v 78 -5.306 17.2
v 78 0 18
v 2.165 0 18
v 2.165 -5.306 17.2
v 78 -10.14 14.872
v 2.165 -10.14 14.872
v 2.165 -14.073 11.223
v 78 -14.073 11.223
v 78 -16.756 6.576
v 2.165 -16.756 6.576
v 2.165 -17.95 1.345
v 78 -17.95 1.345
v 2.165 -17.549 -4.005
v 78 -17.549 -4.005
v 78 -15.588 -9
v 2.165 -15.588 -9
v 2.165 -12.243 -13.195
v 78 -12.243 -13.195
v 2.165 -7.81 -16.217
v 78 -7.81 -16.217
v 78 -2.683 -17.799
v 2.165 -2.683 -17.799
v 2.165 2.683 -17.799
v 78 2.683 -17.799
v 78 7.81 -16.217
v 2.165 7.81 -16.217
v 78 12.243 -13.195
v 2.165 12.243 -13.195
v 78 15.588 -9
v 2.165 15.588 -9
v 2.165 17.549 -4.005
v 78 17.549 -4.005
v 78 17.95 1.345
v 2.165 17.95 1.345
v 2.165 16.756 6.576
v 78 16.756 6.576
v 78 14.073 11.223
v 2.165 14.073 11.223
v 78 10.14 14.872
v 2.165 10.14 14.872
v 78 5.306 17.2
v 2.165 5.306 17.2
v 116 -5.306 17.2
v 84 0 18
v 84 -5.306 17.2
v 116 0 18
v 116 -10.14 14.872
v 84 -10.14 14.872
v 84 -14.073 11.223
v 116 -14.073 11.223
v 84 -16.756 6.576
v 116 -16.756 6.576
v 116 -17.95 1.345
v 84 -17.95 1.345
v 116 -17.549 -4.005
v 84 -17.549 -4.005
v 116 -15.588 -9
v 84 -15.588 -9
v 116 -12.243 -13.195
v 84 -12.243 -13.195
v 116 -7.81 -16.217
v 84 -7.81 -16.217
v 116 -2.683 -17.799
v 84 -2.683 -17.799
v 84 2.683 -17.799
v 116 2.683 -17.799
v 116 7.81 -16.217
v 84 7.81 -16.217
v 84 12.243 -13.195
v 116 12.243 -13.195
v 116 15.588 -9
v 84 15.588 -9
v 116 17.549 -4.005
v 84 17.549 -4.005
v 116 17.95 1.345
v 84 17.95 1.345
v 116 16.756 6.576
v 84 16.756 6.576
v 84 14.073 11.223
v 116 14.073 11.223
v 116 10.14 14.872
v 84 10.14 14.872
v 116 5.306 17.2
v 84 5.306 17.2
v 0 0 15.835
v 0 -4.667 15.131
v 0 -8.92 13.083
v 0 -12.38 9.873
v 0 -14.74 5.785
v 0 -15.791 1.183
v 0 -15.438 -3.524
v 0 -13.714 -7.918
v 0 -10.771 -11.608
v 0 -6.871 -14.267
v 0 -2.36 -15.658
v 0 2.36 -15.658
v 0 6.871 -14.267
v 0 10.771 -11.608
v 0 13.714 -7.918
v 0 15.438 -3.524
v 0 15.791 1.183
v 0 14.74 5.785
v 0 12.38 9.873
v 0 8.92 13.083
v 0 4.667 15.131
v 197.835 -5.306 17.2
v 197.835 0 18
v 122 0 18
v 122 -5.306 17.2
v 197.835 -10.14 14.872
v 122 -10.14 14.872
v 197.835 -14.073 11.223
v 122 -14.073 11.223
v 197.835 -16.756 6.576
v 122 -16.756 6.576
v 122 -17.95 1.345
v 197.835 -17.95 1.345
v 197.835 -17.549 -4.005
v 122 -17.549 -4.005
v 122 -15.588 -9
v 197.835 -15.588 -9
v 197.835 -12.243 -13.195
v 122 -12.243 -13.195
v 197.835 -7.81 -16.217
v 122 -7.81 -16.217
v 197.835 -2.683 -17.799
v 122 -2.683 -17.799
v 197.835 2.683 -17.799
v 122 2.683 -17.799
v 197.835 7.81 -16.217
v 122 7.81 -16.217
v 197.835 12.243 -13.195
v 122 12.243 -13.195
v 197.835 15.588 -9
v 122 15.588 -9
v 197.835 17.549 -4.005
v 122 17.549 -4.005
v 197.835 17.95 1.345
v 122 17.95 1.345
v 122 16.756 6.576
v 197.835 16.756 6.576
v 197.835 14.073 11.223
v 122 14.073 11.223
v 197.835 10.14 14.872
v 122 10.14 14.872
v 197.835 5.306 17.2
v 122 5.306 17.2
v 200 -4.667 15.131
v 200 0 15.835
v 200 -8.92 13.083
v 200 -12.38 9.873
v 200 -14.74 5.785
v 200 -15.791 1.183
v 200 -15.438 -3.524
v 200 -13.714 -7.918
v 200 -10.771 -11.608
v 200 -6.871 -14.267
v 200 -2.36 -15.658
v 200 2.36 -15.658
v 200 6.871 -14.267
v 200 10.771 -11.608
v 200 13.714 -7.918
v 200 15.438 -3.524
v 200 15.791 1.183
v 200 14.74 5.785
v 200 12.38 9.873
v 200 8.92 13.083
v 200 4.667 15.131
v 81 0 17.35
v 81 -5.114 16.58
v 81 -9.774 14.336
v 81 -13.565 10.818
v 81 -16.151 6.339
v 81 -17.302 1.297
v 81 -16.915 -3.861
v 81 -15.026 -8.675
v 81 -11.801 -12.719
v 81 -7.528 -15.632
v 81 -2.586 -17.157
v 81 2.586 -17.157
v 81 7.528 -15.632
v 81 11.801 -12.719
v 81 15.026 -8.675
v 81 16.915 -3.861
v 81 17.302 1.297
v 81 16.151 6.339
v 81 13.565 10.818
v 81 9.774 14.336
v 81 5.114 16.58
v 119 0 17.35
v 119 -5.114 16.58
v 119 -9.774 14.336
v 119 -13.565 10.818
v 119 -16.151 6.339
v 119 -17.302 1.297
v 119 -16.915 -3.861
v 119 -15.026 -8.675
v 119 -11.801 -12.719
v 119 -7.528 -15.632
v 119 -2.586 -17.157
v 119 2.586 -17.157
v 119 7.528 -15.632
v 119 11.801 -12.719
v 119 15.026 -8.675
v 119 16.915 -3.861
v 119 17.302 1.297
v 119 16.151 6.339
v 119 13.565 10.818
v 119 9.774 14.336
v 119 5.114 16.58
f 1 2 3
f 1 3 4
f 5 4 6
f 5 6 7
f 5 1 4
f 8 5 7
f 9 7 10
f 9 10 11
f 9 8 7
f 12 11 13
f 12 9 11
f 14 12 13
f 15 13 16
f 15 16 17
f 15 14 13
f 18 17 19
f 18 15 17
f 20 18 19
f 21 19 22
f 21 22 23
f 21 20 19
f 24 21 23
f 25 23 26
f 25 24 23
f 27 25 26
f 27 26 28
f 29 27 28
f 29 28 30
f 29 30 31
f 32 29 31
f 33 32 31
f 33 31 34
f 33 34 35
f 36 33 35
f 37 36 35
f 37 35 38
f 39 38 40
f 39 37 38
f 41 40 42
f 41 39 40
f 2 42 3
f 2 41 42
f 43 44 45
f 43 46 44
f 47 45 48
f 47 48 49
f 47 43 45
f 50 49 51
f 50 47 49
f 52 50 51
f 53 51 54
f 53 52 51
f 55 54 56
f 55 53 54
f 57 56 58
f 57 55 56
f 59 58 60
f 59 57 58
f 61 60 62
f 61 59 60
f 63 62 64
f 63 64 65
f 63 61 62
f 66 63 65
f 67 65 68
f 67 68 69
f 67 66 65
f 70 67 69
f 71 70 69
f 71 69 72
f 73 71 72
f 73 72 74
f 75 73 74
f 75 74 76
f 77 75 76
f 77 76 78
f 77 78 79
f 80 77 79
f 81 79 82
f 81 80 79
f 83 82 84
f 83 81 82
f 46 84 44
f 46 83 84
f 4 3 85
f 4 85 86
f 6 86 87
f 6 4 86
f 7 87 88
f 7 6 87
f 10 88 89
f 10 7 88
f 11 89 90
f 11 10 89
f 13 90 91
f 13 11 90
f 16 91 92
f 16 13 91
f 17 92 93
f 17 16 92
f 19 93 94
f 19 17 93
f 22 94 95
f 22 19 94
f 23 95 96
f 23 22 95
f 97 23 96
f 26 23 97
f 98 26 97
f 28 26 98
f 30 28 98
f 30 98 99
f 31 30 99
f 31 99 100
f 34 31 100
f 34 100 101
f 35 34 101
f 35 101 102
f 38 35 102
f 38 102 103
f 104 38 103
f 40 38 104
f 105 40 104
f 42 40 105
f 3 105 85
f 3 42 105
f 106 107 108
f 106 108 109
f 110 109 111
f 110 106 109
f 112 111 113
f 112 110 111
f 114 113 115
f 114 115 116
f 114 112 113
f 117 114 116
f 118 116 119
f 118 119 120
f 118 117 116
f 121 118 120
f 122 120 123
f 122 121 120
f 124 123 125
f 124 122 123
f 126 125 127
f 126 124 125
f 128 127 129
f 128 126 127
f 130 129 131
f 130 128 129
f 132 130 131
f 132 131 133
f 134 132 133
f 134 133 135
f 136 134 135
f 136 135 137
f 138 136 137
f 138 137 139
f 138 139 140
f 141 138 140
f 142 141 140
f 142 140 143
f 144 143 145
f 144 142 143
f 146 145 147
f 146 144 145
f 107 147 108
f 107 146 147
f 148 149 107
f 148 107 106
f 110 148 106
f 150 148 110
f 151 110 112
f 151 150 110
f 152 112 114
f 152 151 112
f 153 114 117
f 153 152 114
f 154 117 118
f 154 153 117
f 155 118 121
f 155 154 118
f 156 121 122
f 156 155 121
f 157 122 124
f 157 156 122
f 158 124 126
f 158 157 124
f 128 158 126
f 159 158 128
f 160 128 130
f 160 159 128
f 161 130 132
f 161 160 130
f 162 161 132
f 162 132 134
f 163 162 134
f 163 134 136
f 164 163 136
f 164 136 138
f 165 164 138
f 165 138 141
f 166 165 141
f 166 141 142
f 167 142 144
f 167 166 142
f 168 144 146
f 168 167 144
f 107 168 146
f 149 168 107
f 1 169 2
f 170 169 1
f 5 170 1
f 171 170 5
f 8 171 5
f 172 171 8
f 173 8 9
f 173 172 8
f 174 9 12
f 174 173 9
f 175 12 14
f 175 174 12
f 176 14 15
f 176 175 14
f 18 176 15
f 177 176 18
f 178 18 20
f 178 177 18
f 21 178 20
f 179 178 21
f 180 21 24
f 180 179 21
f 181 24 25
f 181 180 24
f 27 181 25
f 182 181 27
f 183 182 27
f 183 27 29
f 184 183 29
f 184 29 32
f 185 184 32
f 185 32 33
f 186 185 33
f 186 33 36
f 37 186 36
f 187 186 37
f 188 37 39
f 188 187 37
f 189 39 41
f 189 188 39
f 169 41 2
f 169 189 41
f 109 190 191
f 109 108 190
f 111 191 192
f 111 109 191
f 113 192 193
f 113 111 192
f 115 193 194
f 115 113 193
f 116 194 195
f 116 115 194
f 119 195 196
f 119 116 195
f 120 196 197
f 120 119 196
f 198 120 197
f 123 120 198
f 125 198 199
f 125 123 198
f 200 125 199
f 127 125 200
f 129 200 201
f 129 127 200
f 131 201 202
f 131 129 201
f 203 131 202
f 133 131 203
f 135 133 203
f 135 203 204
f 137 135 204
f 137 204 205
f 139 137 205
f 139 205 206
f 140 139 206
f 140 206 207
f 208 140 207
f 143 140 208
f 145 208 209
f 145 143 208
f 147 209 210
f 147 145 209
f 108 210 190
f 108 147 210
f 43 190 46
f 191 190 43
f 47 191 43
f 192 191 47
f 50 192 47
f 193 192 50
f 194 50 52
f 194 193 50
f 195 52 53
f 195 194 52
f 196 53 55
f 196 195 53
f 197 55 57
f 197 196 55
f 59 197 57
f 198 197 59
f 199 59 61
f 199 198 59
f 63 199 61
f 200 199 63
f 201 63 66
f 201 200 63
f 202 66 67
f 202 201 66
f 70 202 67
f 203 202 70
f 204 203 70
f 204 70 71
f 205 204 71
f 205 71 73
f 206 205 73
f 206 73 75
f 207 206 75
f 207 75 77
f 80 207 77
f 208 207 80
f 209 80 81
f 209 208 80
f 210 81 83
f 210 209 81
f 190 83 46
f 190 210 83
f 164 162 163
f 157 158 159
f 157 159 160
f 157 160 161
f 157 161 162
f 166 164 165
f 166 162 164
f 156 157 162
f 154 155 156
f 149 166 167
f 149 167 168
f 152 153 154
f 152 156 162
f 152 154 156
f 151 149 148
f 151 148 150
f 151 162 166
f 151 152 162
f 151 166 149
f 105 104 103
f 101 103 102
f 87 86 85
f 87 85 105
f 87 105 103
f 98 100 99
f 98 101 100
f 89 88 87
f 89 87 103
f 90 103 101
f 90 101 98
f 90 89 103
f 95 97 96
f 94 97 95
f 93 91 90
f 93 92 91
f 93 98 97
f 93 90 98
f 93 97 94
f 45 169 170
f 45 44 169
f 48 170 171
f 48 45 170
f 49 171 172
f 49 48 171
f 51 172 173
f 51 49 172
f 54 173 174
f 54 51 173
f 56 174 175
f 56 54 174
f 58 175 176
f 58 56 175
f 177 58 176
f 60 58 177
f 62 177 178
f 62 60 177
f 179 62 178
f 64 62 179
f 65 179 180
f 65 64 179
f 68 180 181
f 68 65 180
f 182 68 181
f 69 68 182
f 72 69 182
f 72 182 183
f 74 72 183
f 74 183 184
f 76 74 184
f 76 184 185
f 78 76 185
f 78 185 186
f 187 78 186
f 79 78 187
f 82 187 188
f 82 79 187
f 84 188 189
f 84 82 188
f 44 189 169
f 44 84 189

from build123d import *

# Parameters (mm, degrees)
HEADCHAMFER_SIZE = 2.165


with BuildPart() as part:
    # Sketch1 → Base (revolve)
    with BuildSketch(Plane.XY, mode=Mode.PRIVATE) as base_sk:
        Polygon((0, 0), (0, 18), (78, 18), (84, 16.701), (116, 16.701), (122, 18), (200, 18), (200, 0), align=None)
    revolve(base_sk.sketch.rotate(Axis((-1.310841664, 0, 0), (1, 0, 0)), 90), axis=Axis((-1.310841664, 0, 0), (1, 0, 0)))

    # HeadChamfer
    headchamfer_edges = [part.edges().sort_by_distance(p)[0] for p in [
        (200, 0, -18),
        (0, 0, -18),
    ]]
    chamfer(headchamfer_edges, length=HEADCHAMFER_SIZE)

    # Sketch4 → BaseBody (revolve)
    with BuildSketch(Plane.XY, mode=Mode.PRIVATE) as basebody_sk:
        Polygon((78, 16.701), (84, 18), (116, 18), (122, 16.701), align=None)
    revolve(basebody_sk.sketch.rotate(Axis((-7.809086942, 0, 0), (1, 0, 0)), 90), axis=Axis((-7.809086942, 0, 0), (1, 0, 0)))


solid = part.part
